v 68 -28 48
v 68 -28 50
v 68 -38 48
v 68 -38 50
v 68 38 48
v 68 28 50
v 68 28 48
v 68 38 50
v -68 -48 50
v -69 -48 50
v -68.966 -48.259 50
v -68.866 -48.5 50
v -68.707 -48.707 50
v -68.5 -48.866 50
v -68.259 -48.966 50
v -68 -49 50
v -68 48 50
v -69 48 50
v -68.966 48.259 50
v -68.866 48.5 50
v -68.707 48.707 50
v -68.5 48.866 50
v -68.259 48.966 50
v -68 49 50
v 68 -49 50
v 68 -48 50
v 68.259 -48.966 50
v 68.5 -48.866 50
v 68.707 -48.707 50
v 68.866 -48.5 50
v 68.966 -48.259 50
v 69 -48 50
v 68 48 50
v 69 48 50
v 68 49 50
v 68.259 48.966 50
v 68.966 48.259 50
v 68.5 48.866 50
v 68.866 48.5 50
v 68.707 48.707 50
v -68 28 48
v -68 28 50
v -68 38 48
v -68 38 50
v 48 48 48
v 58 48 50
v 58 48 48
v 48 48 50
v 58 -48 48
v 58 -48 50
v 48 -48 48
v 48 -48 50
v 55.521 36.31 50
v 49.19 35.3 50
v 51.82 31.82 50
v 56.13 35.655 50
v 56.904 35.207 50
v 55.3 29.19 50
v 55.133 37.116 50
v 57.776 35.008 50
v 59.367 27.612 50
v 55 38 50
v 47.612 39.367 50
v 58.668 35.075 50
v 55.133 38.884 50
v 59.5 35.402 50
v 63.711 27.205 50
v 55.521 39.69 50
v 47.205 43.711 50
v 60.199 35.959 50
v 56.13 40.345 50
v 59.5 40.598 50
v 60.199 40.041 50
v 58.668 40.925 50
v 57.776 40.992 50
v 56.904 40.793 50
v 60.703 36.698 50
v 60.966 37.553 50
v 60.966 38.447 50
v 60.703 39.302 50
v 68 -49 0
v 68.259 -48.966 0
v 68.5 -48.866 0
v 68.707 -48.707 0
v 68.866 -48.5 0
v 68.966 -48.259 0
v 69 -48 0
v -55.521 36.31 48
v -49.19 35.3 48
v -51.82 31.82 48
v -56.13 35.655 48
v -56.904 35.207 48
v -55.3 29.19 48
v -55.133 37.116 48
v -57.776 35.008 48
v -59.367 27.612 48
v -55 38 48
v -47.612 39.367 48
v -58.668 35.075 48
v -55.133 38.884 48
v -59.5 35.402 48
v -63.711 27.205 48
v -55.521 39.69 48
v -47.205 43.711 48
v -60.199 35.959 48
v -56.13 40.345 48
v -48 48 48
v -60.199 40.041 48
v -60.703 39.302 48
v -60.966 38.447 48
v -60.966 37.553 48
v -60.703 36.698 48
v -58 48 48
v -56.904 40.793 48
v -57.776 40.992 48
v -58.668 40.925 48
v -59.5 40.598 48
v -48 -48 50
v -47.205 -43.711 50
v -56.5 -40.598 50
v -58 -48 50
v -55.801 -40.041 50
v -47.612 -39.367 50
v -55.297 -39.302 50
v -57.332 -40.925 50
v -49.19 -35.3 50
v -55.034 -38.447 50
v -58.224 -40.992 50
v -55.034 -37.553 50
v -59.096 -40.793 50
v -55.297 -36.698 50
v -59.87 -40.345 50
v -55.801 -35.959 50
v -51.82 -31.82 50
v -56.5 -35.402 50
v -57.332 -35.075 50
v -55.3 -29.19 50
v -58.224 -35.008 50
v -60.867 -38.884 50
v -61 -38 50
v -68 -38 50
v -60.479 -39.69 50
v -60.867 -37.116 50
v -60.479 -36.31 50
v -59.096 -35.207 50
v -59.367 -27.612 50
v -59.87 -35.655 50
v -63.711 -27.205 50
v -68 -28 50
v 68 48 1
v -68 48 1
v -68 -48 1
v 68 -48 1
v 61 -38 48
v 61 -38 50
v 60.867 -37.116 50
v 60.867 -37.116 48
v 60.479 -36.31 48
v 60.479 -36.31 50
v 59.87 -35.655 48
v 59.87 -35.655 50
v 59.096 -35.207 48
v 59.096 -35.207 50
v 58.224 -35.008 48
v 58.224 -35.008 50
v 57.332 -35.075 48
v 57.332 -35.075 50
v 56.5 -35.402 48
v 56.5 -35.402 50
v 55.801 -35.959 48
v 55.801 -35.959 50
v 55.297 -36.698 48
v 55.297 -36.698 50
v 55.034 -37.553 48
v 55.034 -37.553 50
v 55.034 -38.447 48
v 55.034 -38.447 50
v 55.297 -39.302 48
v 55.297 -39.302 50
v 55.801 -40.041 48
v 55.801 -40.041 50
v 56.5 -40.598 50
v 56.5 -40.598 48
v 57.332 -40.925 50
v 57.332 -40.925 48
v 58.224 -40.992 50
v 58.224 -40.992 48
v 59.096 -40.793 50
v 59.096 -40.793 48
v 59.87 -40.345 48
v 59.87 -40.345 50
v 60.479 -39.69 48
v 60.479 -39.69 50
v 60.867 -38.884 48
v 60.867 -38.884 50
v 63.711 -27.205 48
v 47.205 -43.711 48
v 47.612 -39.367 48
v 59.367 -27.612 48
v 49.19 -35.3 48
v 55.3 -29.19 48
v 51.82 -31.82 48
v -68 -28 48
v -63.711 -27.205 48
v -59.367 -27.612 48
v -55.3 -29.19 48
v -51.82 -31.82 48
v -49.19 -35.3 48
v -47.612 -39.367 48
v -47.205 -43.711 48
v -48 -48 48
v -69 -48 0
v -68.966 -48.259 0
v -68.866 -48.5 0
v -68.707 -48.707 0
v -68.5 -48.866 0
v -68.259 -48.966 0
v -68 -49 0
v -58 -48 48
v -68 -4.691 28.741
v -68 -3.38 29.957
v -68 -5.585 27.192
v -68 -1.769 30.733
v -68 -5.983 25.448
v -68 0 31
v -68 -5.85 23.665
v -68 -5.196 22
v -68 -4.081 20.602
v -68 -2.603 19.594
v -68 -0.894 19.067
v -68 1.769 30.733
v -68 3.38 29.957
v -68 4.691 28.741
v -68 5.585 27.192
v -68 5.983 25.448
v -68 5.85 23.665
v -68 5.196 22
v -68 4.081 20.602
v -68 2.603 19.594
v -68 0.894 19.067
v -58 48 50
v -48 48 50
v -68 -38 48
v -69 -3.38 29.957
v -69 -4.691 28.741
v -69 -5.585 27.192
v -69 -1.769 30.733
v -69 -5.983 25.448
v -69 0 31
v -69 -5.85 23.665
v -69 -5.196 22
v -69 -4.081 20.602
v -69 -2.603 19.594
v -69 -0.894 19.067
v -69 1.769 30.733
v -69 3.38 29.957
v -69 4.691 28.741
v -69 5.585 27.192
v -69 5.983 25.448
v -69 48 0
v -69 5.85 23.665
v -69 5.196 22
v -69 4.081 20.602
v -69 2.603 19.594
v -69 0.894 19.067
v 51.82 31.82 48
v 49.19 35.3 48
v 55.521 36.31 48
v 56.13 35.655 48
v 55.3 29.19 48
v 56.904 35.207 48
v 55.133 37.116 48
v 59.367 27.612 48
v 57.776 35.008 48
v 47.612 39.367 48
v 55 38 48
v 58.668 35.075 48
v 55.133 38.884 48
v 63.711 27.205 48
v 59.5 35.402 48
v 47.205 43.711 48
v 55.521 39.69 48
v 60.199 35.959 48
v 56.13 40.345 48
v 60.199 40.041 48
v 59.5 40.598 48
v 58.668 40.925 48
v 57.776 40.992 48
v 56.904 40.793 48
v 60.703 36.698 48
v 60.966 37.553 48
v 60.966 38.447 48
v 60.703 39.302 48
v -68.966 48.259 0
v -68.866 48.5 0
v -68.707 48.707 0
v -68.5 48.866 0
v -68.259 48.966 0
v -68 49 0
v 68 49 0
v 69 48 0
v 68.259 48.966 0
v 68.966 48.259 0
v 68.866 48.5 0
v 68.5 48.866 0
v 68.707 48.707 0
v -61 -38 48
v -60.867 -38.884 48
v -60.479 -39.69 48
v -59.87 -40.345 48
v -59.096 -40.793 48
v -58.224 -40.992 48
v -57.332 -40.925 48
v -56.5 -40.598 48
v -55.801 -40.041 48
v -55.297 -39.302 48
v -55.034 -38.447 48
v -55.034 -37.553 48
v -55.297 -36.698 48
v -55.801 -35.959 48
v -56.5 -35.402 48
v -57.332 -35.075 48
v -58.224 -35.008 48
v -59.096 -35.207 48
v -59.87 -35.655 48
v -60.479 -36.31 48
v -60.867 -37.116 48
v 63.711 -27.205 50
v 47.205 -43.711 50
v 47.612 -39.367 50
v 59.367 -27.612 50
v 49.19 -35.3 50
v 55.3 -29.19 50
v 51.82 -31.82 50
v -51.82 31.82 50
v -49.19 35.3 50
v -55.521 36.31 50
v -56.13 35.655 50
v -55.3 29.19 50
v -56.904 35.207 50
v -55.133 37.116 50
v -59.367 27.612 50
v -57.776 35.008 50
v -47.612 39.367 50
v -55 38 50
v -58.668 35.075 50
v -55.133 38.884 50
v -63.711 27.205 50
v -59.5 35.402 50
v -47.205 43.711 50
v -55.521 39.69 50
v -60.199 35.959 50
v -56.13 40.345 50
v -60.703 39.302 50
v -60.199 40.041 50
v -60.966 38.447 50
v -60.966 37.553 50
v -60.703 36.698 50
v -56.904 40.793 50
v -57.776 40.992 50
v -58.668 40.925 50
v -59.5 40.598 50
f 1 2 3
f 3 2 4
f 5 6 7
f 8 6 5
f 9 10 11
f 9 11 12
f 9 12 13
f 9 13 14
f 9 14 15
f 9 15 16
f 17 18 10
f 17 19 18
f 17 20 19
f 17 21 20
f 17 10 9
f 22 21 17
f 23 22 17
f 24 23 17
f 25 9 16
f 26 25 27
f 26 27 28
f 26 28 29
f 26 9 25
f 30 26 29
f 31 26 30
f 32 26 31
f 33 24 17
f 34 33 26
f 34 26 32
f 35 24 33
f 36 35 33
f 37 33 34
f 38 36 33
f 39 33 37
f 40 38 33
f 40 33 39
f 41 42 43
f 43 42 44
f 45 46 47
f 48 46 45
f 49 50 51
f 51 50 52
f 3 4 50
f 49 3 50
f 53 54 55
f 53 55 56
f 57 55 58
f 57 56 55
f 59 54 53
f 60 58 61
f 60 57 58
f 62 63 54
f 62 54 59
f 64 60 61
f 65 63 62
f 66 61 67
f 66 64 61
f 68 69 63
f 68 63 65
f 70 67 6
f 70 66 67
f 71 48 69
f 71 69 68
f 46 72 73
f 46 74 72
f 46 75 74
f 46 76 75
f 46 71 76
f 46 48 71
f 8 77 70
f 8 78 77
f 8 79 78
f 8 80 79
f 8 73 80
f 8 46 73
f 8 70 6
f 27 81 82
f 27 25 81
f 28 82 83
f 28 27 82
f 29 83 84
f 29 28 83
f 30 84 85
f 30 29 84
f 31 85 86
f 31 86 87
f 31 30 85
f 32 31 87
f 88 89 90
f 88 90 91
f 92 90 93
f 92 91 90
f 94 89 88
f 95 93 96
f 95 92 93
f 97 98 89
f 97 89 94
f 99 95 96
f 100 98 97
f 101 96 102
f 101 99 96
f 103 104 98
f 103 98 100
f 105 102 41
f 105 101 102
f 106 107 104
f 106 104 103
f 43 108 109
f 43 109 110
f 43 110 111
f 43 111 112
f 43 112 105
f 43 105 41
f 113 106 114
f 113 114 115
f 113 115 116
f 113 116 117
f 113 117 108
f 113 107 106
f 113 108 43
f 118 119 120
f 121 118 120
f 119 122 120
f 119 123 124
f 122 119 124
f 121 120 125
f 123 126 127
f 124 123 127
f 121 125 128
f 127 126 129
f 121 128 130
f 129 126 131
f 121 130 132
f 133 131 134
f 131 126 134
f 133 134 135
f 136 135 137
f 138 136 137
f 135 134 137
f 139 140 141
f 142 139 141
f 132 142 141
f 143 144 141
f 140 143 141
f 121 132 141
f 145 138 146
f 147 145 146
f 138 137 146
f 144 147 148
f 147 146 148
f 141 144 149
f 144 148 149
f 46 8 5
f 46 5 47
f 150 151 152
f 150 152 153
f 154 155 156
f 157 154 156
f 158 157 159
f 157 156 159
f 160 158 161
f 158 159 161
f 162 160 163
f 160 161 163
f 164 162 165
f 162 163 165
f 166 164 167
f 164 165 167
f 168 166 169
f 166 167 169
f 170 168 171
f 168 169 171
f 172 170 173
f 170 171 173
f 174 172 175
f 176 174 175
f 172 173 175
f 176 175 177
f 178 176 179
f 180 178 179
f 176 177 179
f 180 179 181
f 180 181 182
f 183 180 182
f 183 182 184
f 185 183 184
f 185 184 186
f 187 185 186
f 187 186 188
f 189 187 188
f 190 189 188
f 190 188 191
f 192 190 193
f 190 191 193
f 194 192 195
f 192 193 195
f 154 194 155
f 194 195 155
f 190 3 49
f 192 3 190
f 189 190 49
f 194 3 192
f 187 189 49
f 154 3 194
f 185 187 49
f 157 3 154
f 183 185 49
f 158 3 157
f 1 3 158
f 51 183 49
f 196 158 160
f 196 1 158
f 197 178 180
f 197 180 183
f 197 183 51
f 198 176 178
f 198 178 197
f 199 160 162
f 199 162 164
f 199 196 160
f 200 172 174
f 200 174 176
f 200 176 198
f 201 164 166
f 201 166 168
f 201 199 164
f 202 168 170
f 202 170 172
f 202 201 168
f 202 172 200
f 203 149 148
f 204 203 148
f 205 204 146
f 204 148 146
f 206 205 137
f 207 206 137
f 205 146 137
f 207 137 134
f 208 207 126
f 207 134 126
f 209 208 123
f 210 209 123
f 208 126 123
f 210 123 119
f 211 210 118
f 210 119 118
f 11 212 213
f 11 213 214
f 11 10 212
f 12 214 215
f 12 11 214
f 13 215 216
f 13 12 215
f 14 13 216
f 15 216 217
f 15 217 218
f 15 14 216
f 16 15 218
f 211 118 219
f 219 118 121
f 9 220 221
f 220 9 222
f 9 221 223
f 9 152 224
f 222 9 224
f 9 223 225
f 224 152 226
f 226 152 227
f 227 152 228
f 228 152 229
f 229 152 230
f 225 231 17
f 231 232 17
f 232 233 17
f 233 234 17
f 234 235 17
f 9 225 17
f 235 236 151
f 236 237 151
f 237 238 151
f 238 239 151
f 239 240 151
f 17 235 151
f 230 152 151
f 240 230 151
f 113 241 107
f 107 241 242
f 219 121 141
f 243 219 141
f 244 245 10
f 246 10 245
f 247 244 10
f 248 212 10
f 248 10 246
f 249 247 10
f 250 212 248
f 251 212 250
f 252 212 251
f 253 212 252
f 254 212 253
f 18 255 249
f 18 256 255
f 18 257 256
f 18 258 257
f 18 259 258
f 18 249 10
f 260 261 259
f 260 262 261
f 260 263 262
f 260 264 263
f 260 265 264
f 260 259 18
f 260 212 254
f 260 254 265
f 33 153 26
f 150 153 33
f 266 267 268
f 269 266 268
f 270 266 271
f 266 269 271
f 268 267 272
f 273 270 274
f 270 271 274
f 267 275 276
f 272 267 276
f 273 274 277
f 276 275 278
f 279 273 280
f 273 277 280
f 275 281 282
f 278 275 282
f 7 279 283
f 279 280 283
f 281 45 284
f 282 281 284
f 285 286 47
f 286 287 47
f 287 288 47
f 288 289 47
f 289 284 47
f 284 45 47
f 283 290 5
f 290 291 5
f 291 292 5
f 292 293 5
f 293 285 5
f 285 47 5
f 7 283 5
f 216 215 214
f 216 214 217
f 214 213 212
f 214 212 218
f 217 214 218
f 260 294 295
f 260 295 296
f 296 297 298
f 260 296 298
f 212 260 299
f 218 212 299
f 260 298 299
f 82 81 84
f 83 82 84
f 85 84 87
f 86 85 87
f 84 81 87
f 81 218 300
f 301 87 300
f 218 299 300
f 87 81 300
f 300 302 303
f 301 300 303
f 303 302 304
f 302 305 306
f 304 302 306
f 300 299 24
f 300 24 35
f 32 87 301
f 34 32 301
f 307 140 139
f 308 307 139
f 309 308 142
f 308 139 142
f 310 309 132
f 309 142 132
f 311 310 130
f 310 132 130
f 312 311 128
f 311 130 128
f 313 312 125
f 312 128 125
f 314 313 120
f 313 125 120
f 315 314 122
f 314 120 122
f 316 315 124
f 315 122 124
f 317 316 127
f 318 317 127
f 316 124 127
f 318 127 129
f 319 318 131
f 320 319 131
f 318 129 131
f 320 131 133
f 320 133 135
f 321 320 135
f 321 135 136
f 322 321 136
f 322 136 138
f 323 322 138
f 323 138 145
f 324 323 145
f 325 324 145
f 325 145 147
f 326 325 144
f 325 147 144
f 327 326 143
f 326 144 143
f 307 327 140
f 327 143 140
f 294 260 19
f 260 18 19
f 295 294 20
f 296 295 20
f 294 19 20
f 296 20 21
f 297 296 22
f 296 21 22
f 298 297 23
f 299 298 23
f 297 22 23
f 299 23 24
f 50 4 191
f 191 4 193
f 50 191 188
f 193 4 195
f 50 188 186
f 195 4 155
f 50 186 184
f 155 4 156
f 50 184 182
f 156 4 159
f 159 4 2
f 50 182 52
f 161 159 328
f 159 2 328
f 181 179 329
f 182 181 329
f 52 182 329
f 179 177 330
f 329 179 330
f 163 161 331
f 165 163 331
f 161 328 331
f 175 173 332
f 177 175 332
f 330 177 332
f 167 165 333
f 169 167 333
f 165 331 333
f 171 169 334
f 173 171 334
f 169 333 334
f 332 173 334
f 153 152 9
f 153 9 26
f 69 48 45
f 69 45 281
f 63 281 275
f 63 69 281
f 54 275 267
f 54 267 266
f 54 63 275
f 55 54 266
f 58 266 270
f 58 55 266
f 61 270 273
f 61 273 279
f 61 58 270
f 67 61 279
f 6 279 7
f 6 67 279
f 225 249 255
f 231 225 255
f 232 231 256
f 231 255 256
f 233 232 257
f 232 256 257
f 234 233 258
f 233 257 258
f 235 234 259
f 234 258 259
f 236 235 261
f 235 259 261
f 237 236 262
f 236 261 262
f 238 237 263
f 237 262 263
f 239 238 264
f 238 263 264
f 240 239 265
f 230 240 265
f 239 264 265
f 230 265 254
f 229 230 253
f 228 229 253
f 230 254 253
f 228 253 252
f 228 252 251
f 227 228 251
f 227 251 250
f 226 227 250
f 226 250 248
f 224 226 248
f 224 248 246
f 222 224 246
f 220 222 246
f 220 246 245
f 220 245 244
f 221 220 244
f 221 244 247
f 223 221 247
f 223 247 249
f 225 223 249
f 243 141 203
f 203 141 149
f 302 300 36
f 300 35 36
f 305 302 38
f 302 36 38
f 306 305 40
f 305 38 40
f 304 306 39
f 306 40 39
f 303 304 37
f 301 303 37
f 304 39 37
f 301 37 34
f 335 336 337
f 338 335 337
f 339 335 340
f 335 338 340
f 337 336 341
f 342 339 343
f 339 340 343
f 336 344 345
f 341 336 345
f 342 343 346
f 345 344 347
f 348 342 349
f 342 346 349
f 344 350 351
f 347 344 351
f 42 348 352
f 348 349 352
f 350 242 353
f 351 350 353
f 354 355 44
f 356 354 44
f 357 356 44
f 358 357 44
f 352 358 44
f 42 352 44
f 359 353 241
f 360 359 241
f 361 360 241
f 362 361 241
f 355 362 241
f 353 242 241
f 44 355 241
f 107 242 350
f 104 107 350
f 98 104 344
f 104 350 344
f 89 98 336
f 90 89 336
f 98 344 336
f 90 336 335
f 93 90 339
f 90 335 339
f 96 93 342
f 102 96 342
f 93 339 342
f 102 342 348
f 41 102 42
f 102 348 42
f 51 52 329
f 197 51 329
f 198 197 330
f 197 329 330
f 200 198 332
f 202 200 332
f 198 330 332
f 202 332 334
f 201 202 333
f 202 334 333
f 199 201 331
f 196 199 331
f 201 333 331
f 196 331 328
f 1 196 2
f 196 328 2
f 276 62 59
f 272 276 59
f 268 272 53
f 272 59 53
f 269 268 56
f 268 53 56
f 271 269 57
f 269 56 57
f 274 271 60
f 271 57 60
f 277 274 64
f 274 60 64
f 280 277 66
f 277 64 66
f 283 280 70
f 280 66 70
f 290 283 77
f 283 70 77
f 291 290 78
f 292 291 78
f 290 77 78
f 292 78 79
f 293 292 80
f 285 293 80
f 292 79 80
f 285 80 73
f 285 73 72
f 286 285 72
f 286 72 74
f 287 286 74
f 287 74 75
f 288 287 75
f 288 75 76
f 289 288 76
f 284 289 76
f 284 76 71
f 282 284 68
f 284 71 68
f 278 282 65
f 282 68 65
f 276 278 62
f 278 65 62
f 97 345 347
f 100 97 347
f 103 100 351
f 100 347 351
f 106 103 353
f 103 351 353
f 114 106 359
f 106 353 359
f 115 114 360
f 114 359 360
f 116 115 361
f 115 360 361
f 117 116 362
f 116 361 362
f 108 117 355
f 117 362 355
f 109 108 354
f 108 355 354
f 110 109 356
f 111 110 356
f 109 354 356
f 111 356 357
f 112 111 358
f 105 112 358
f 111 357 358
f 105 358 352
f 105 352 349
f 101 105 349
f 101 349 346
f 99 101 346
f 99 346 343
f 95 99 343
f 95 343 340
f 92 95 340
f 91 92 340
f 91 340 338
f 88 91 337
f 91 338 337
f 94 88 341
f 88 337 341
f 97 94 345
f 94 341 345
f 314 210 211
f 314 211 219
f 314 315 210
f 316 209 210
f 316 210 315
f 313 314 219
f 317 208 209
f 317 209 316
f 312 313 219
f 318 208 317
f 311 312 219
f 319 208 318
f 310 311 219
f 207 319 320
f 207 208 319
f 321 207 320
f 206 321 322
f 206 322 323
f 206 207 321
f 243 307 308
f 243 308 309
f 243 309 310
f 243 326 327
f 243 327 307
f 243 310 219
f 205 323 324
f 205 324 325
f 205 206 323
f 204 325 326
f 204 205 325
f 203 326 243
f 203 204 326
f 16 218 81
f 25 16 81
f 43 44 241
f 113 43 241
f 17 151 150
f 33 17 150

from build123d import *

# Parameters (mm, degrees)
CROQUIS1_W                = 138
CROQUIS1_H                = 98
CROQUIS1_W_2              = 136
CROQUIS1_H_2              = 96
SALIENTE_EXTRUIR2_DEPTH   = 50
CROQUIS2_W                = 136
CROQUIS2_H                = 96
SALIENTE_EXTRUIR3_DEPTH   = 1
REDONDEO1_R               = 1
CROQUIS7_R                = 3
SALIENTE_EXTRUIR6_DEPTH   = 2
SALIENTE_EXTRUIR6_2_DEPTH = 2
SALIENTE_EXTRUIR6_3_DEPTH = 2
SALIENTE_EXTRUIR6_4_DEPTH = 2
CROQUIS8_R                = 6
CORTAR_EXTRUIR1_DEPTH     = 2


with BuildPart() as part:
    # Croquis1 → Saliente-Extruir2 (new body)
    with BuildSketch(Plane.XY):
        Rectangle(CROQUIS1_W, CROQUIS1_H)
        Rectangle(CROQUIS1_W_2, CROQUIS1_H_2, mode=Mode.SUBTRACT)
    extrude(amount=SALIENTE_EXTRUIR2_DEPTH)

    # Croquis2 → Saliente-Extruir3 (add)
    with BuildSketch(Plane.XY):
        Rectangle(CROQUIS2_W, CROQUIS2_H)
    extrude(amount=SALIENTE_EXTRUIR3_DEPTH)

    # Redondeo1
    redondeo1_edges = [part.edges().sort_by_distance(p)[0] for p in [
        (69, -49, 25),
        (-69, -49, 25),
        (-69, 49, 25),
        (69, 49, 25),
    ]]
    fillet(redondeo1_edges, radius=REDONDEO1_R)

    # Croquis8 → Cortar-Extruir1 (cut)
    with BuildSketch(Plane.ZY.offset(69)):
        with Locations((25, 0)):
            Circle(CROQUIS8_R)
    extrude(amount=-CORTAR_EXTRUIR1_DEPTH, mode=Mode.SUBTRACT)


with BuildPart() as body_2:
    # Croquis7 → Saliente-Extruir6 (new body)
    with BuildSketch(Plane.XY.offset(50)):
        with BuildLine():
            Line((-68, 38), (-58, 48))
            Line((-58, 48), (-48, 48))
            ThreePointArc((-48, 48), (-51.819660113, 31.819660113), (-68, 28))
            Line((-68, 28), (-68, 38))
        make_face()
        with Locations((-58, 38)):
            Circle(CROQUIS7_R, mode=Mode.SUBTRACT)
    extrude(amount=-SALIENTE_EXTRUIR6_DEPTH)


with BuildPart() as body_3:
    # Croquis7 → Saliente-Extruir6 2 (new body)
    with BuildSketch(Plane.XY.offset(50)):
        with BuildLine():
            Line((58, 48), (48, 48))
            ThreePointArc((48, 48), (51.819660113, 31.819660113), (68, 28))
            Line((68, 28), (68, 38))
            Line((68, 38), (58, 48))
        make_face()
        with Locations(Location((58, 38, 0), (0, 0, 180))):
            Circle(CROQUIS7_R, mode=Mode.SUBTRACT)
    extrude(amount=-SALIENTE_EXTRUIR6_2_DEPTH)


with BuildPart() as body_4:
    # Croquis7 → Saliente-Extruir6 3 (new body)
    with BuildSketch(Plane.XY.offset(50)):
        with BuildLine():
            Line((58, -48), (48, -48))
            ThreePointArc((48, -48), (51.819660113, -31.819660113), (68, -28))
            Line((68, -28), (68, -38))
            Line((68, -38), (58, -48))
        make_face()
        with Locations((58, -38)):
            Circle(CROQUIS7_R, mode=Mode.SUBTRACT)
    extrude(amount=-SALIENTE_EXTRUIR6_3_DEPTH)


with BuildPart() as body_5:
    # Croquis7 → Saliente-Extruir6 4 (new body)
    with BuildSketch(Plane.XY.offset(50)):
        with BuildLine():
            Line((-68, -38), (-68, -28))
            ThreePointArc((-68, -28), (-51.819660113, -31.819660113), (-48, -48))
            Line((-48, -48), (-58, -48))
            Line((-58, -48), (-68, -38))
        make_face()
        with Locations(Location((-58, -38, 0), (0, 0, 180))):
            Circle(CROQUIS7_R, mode=Mode.SUBTRACT)
    extrude(amount=-SALIENTE_EXTRUIR6_4_DEPTH)


solid = Compound([part.part, body_2.part, body_3.part, body_4.part, body_5.part])
